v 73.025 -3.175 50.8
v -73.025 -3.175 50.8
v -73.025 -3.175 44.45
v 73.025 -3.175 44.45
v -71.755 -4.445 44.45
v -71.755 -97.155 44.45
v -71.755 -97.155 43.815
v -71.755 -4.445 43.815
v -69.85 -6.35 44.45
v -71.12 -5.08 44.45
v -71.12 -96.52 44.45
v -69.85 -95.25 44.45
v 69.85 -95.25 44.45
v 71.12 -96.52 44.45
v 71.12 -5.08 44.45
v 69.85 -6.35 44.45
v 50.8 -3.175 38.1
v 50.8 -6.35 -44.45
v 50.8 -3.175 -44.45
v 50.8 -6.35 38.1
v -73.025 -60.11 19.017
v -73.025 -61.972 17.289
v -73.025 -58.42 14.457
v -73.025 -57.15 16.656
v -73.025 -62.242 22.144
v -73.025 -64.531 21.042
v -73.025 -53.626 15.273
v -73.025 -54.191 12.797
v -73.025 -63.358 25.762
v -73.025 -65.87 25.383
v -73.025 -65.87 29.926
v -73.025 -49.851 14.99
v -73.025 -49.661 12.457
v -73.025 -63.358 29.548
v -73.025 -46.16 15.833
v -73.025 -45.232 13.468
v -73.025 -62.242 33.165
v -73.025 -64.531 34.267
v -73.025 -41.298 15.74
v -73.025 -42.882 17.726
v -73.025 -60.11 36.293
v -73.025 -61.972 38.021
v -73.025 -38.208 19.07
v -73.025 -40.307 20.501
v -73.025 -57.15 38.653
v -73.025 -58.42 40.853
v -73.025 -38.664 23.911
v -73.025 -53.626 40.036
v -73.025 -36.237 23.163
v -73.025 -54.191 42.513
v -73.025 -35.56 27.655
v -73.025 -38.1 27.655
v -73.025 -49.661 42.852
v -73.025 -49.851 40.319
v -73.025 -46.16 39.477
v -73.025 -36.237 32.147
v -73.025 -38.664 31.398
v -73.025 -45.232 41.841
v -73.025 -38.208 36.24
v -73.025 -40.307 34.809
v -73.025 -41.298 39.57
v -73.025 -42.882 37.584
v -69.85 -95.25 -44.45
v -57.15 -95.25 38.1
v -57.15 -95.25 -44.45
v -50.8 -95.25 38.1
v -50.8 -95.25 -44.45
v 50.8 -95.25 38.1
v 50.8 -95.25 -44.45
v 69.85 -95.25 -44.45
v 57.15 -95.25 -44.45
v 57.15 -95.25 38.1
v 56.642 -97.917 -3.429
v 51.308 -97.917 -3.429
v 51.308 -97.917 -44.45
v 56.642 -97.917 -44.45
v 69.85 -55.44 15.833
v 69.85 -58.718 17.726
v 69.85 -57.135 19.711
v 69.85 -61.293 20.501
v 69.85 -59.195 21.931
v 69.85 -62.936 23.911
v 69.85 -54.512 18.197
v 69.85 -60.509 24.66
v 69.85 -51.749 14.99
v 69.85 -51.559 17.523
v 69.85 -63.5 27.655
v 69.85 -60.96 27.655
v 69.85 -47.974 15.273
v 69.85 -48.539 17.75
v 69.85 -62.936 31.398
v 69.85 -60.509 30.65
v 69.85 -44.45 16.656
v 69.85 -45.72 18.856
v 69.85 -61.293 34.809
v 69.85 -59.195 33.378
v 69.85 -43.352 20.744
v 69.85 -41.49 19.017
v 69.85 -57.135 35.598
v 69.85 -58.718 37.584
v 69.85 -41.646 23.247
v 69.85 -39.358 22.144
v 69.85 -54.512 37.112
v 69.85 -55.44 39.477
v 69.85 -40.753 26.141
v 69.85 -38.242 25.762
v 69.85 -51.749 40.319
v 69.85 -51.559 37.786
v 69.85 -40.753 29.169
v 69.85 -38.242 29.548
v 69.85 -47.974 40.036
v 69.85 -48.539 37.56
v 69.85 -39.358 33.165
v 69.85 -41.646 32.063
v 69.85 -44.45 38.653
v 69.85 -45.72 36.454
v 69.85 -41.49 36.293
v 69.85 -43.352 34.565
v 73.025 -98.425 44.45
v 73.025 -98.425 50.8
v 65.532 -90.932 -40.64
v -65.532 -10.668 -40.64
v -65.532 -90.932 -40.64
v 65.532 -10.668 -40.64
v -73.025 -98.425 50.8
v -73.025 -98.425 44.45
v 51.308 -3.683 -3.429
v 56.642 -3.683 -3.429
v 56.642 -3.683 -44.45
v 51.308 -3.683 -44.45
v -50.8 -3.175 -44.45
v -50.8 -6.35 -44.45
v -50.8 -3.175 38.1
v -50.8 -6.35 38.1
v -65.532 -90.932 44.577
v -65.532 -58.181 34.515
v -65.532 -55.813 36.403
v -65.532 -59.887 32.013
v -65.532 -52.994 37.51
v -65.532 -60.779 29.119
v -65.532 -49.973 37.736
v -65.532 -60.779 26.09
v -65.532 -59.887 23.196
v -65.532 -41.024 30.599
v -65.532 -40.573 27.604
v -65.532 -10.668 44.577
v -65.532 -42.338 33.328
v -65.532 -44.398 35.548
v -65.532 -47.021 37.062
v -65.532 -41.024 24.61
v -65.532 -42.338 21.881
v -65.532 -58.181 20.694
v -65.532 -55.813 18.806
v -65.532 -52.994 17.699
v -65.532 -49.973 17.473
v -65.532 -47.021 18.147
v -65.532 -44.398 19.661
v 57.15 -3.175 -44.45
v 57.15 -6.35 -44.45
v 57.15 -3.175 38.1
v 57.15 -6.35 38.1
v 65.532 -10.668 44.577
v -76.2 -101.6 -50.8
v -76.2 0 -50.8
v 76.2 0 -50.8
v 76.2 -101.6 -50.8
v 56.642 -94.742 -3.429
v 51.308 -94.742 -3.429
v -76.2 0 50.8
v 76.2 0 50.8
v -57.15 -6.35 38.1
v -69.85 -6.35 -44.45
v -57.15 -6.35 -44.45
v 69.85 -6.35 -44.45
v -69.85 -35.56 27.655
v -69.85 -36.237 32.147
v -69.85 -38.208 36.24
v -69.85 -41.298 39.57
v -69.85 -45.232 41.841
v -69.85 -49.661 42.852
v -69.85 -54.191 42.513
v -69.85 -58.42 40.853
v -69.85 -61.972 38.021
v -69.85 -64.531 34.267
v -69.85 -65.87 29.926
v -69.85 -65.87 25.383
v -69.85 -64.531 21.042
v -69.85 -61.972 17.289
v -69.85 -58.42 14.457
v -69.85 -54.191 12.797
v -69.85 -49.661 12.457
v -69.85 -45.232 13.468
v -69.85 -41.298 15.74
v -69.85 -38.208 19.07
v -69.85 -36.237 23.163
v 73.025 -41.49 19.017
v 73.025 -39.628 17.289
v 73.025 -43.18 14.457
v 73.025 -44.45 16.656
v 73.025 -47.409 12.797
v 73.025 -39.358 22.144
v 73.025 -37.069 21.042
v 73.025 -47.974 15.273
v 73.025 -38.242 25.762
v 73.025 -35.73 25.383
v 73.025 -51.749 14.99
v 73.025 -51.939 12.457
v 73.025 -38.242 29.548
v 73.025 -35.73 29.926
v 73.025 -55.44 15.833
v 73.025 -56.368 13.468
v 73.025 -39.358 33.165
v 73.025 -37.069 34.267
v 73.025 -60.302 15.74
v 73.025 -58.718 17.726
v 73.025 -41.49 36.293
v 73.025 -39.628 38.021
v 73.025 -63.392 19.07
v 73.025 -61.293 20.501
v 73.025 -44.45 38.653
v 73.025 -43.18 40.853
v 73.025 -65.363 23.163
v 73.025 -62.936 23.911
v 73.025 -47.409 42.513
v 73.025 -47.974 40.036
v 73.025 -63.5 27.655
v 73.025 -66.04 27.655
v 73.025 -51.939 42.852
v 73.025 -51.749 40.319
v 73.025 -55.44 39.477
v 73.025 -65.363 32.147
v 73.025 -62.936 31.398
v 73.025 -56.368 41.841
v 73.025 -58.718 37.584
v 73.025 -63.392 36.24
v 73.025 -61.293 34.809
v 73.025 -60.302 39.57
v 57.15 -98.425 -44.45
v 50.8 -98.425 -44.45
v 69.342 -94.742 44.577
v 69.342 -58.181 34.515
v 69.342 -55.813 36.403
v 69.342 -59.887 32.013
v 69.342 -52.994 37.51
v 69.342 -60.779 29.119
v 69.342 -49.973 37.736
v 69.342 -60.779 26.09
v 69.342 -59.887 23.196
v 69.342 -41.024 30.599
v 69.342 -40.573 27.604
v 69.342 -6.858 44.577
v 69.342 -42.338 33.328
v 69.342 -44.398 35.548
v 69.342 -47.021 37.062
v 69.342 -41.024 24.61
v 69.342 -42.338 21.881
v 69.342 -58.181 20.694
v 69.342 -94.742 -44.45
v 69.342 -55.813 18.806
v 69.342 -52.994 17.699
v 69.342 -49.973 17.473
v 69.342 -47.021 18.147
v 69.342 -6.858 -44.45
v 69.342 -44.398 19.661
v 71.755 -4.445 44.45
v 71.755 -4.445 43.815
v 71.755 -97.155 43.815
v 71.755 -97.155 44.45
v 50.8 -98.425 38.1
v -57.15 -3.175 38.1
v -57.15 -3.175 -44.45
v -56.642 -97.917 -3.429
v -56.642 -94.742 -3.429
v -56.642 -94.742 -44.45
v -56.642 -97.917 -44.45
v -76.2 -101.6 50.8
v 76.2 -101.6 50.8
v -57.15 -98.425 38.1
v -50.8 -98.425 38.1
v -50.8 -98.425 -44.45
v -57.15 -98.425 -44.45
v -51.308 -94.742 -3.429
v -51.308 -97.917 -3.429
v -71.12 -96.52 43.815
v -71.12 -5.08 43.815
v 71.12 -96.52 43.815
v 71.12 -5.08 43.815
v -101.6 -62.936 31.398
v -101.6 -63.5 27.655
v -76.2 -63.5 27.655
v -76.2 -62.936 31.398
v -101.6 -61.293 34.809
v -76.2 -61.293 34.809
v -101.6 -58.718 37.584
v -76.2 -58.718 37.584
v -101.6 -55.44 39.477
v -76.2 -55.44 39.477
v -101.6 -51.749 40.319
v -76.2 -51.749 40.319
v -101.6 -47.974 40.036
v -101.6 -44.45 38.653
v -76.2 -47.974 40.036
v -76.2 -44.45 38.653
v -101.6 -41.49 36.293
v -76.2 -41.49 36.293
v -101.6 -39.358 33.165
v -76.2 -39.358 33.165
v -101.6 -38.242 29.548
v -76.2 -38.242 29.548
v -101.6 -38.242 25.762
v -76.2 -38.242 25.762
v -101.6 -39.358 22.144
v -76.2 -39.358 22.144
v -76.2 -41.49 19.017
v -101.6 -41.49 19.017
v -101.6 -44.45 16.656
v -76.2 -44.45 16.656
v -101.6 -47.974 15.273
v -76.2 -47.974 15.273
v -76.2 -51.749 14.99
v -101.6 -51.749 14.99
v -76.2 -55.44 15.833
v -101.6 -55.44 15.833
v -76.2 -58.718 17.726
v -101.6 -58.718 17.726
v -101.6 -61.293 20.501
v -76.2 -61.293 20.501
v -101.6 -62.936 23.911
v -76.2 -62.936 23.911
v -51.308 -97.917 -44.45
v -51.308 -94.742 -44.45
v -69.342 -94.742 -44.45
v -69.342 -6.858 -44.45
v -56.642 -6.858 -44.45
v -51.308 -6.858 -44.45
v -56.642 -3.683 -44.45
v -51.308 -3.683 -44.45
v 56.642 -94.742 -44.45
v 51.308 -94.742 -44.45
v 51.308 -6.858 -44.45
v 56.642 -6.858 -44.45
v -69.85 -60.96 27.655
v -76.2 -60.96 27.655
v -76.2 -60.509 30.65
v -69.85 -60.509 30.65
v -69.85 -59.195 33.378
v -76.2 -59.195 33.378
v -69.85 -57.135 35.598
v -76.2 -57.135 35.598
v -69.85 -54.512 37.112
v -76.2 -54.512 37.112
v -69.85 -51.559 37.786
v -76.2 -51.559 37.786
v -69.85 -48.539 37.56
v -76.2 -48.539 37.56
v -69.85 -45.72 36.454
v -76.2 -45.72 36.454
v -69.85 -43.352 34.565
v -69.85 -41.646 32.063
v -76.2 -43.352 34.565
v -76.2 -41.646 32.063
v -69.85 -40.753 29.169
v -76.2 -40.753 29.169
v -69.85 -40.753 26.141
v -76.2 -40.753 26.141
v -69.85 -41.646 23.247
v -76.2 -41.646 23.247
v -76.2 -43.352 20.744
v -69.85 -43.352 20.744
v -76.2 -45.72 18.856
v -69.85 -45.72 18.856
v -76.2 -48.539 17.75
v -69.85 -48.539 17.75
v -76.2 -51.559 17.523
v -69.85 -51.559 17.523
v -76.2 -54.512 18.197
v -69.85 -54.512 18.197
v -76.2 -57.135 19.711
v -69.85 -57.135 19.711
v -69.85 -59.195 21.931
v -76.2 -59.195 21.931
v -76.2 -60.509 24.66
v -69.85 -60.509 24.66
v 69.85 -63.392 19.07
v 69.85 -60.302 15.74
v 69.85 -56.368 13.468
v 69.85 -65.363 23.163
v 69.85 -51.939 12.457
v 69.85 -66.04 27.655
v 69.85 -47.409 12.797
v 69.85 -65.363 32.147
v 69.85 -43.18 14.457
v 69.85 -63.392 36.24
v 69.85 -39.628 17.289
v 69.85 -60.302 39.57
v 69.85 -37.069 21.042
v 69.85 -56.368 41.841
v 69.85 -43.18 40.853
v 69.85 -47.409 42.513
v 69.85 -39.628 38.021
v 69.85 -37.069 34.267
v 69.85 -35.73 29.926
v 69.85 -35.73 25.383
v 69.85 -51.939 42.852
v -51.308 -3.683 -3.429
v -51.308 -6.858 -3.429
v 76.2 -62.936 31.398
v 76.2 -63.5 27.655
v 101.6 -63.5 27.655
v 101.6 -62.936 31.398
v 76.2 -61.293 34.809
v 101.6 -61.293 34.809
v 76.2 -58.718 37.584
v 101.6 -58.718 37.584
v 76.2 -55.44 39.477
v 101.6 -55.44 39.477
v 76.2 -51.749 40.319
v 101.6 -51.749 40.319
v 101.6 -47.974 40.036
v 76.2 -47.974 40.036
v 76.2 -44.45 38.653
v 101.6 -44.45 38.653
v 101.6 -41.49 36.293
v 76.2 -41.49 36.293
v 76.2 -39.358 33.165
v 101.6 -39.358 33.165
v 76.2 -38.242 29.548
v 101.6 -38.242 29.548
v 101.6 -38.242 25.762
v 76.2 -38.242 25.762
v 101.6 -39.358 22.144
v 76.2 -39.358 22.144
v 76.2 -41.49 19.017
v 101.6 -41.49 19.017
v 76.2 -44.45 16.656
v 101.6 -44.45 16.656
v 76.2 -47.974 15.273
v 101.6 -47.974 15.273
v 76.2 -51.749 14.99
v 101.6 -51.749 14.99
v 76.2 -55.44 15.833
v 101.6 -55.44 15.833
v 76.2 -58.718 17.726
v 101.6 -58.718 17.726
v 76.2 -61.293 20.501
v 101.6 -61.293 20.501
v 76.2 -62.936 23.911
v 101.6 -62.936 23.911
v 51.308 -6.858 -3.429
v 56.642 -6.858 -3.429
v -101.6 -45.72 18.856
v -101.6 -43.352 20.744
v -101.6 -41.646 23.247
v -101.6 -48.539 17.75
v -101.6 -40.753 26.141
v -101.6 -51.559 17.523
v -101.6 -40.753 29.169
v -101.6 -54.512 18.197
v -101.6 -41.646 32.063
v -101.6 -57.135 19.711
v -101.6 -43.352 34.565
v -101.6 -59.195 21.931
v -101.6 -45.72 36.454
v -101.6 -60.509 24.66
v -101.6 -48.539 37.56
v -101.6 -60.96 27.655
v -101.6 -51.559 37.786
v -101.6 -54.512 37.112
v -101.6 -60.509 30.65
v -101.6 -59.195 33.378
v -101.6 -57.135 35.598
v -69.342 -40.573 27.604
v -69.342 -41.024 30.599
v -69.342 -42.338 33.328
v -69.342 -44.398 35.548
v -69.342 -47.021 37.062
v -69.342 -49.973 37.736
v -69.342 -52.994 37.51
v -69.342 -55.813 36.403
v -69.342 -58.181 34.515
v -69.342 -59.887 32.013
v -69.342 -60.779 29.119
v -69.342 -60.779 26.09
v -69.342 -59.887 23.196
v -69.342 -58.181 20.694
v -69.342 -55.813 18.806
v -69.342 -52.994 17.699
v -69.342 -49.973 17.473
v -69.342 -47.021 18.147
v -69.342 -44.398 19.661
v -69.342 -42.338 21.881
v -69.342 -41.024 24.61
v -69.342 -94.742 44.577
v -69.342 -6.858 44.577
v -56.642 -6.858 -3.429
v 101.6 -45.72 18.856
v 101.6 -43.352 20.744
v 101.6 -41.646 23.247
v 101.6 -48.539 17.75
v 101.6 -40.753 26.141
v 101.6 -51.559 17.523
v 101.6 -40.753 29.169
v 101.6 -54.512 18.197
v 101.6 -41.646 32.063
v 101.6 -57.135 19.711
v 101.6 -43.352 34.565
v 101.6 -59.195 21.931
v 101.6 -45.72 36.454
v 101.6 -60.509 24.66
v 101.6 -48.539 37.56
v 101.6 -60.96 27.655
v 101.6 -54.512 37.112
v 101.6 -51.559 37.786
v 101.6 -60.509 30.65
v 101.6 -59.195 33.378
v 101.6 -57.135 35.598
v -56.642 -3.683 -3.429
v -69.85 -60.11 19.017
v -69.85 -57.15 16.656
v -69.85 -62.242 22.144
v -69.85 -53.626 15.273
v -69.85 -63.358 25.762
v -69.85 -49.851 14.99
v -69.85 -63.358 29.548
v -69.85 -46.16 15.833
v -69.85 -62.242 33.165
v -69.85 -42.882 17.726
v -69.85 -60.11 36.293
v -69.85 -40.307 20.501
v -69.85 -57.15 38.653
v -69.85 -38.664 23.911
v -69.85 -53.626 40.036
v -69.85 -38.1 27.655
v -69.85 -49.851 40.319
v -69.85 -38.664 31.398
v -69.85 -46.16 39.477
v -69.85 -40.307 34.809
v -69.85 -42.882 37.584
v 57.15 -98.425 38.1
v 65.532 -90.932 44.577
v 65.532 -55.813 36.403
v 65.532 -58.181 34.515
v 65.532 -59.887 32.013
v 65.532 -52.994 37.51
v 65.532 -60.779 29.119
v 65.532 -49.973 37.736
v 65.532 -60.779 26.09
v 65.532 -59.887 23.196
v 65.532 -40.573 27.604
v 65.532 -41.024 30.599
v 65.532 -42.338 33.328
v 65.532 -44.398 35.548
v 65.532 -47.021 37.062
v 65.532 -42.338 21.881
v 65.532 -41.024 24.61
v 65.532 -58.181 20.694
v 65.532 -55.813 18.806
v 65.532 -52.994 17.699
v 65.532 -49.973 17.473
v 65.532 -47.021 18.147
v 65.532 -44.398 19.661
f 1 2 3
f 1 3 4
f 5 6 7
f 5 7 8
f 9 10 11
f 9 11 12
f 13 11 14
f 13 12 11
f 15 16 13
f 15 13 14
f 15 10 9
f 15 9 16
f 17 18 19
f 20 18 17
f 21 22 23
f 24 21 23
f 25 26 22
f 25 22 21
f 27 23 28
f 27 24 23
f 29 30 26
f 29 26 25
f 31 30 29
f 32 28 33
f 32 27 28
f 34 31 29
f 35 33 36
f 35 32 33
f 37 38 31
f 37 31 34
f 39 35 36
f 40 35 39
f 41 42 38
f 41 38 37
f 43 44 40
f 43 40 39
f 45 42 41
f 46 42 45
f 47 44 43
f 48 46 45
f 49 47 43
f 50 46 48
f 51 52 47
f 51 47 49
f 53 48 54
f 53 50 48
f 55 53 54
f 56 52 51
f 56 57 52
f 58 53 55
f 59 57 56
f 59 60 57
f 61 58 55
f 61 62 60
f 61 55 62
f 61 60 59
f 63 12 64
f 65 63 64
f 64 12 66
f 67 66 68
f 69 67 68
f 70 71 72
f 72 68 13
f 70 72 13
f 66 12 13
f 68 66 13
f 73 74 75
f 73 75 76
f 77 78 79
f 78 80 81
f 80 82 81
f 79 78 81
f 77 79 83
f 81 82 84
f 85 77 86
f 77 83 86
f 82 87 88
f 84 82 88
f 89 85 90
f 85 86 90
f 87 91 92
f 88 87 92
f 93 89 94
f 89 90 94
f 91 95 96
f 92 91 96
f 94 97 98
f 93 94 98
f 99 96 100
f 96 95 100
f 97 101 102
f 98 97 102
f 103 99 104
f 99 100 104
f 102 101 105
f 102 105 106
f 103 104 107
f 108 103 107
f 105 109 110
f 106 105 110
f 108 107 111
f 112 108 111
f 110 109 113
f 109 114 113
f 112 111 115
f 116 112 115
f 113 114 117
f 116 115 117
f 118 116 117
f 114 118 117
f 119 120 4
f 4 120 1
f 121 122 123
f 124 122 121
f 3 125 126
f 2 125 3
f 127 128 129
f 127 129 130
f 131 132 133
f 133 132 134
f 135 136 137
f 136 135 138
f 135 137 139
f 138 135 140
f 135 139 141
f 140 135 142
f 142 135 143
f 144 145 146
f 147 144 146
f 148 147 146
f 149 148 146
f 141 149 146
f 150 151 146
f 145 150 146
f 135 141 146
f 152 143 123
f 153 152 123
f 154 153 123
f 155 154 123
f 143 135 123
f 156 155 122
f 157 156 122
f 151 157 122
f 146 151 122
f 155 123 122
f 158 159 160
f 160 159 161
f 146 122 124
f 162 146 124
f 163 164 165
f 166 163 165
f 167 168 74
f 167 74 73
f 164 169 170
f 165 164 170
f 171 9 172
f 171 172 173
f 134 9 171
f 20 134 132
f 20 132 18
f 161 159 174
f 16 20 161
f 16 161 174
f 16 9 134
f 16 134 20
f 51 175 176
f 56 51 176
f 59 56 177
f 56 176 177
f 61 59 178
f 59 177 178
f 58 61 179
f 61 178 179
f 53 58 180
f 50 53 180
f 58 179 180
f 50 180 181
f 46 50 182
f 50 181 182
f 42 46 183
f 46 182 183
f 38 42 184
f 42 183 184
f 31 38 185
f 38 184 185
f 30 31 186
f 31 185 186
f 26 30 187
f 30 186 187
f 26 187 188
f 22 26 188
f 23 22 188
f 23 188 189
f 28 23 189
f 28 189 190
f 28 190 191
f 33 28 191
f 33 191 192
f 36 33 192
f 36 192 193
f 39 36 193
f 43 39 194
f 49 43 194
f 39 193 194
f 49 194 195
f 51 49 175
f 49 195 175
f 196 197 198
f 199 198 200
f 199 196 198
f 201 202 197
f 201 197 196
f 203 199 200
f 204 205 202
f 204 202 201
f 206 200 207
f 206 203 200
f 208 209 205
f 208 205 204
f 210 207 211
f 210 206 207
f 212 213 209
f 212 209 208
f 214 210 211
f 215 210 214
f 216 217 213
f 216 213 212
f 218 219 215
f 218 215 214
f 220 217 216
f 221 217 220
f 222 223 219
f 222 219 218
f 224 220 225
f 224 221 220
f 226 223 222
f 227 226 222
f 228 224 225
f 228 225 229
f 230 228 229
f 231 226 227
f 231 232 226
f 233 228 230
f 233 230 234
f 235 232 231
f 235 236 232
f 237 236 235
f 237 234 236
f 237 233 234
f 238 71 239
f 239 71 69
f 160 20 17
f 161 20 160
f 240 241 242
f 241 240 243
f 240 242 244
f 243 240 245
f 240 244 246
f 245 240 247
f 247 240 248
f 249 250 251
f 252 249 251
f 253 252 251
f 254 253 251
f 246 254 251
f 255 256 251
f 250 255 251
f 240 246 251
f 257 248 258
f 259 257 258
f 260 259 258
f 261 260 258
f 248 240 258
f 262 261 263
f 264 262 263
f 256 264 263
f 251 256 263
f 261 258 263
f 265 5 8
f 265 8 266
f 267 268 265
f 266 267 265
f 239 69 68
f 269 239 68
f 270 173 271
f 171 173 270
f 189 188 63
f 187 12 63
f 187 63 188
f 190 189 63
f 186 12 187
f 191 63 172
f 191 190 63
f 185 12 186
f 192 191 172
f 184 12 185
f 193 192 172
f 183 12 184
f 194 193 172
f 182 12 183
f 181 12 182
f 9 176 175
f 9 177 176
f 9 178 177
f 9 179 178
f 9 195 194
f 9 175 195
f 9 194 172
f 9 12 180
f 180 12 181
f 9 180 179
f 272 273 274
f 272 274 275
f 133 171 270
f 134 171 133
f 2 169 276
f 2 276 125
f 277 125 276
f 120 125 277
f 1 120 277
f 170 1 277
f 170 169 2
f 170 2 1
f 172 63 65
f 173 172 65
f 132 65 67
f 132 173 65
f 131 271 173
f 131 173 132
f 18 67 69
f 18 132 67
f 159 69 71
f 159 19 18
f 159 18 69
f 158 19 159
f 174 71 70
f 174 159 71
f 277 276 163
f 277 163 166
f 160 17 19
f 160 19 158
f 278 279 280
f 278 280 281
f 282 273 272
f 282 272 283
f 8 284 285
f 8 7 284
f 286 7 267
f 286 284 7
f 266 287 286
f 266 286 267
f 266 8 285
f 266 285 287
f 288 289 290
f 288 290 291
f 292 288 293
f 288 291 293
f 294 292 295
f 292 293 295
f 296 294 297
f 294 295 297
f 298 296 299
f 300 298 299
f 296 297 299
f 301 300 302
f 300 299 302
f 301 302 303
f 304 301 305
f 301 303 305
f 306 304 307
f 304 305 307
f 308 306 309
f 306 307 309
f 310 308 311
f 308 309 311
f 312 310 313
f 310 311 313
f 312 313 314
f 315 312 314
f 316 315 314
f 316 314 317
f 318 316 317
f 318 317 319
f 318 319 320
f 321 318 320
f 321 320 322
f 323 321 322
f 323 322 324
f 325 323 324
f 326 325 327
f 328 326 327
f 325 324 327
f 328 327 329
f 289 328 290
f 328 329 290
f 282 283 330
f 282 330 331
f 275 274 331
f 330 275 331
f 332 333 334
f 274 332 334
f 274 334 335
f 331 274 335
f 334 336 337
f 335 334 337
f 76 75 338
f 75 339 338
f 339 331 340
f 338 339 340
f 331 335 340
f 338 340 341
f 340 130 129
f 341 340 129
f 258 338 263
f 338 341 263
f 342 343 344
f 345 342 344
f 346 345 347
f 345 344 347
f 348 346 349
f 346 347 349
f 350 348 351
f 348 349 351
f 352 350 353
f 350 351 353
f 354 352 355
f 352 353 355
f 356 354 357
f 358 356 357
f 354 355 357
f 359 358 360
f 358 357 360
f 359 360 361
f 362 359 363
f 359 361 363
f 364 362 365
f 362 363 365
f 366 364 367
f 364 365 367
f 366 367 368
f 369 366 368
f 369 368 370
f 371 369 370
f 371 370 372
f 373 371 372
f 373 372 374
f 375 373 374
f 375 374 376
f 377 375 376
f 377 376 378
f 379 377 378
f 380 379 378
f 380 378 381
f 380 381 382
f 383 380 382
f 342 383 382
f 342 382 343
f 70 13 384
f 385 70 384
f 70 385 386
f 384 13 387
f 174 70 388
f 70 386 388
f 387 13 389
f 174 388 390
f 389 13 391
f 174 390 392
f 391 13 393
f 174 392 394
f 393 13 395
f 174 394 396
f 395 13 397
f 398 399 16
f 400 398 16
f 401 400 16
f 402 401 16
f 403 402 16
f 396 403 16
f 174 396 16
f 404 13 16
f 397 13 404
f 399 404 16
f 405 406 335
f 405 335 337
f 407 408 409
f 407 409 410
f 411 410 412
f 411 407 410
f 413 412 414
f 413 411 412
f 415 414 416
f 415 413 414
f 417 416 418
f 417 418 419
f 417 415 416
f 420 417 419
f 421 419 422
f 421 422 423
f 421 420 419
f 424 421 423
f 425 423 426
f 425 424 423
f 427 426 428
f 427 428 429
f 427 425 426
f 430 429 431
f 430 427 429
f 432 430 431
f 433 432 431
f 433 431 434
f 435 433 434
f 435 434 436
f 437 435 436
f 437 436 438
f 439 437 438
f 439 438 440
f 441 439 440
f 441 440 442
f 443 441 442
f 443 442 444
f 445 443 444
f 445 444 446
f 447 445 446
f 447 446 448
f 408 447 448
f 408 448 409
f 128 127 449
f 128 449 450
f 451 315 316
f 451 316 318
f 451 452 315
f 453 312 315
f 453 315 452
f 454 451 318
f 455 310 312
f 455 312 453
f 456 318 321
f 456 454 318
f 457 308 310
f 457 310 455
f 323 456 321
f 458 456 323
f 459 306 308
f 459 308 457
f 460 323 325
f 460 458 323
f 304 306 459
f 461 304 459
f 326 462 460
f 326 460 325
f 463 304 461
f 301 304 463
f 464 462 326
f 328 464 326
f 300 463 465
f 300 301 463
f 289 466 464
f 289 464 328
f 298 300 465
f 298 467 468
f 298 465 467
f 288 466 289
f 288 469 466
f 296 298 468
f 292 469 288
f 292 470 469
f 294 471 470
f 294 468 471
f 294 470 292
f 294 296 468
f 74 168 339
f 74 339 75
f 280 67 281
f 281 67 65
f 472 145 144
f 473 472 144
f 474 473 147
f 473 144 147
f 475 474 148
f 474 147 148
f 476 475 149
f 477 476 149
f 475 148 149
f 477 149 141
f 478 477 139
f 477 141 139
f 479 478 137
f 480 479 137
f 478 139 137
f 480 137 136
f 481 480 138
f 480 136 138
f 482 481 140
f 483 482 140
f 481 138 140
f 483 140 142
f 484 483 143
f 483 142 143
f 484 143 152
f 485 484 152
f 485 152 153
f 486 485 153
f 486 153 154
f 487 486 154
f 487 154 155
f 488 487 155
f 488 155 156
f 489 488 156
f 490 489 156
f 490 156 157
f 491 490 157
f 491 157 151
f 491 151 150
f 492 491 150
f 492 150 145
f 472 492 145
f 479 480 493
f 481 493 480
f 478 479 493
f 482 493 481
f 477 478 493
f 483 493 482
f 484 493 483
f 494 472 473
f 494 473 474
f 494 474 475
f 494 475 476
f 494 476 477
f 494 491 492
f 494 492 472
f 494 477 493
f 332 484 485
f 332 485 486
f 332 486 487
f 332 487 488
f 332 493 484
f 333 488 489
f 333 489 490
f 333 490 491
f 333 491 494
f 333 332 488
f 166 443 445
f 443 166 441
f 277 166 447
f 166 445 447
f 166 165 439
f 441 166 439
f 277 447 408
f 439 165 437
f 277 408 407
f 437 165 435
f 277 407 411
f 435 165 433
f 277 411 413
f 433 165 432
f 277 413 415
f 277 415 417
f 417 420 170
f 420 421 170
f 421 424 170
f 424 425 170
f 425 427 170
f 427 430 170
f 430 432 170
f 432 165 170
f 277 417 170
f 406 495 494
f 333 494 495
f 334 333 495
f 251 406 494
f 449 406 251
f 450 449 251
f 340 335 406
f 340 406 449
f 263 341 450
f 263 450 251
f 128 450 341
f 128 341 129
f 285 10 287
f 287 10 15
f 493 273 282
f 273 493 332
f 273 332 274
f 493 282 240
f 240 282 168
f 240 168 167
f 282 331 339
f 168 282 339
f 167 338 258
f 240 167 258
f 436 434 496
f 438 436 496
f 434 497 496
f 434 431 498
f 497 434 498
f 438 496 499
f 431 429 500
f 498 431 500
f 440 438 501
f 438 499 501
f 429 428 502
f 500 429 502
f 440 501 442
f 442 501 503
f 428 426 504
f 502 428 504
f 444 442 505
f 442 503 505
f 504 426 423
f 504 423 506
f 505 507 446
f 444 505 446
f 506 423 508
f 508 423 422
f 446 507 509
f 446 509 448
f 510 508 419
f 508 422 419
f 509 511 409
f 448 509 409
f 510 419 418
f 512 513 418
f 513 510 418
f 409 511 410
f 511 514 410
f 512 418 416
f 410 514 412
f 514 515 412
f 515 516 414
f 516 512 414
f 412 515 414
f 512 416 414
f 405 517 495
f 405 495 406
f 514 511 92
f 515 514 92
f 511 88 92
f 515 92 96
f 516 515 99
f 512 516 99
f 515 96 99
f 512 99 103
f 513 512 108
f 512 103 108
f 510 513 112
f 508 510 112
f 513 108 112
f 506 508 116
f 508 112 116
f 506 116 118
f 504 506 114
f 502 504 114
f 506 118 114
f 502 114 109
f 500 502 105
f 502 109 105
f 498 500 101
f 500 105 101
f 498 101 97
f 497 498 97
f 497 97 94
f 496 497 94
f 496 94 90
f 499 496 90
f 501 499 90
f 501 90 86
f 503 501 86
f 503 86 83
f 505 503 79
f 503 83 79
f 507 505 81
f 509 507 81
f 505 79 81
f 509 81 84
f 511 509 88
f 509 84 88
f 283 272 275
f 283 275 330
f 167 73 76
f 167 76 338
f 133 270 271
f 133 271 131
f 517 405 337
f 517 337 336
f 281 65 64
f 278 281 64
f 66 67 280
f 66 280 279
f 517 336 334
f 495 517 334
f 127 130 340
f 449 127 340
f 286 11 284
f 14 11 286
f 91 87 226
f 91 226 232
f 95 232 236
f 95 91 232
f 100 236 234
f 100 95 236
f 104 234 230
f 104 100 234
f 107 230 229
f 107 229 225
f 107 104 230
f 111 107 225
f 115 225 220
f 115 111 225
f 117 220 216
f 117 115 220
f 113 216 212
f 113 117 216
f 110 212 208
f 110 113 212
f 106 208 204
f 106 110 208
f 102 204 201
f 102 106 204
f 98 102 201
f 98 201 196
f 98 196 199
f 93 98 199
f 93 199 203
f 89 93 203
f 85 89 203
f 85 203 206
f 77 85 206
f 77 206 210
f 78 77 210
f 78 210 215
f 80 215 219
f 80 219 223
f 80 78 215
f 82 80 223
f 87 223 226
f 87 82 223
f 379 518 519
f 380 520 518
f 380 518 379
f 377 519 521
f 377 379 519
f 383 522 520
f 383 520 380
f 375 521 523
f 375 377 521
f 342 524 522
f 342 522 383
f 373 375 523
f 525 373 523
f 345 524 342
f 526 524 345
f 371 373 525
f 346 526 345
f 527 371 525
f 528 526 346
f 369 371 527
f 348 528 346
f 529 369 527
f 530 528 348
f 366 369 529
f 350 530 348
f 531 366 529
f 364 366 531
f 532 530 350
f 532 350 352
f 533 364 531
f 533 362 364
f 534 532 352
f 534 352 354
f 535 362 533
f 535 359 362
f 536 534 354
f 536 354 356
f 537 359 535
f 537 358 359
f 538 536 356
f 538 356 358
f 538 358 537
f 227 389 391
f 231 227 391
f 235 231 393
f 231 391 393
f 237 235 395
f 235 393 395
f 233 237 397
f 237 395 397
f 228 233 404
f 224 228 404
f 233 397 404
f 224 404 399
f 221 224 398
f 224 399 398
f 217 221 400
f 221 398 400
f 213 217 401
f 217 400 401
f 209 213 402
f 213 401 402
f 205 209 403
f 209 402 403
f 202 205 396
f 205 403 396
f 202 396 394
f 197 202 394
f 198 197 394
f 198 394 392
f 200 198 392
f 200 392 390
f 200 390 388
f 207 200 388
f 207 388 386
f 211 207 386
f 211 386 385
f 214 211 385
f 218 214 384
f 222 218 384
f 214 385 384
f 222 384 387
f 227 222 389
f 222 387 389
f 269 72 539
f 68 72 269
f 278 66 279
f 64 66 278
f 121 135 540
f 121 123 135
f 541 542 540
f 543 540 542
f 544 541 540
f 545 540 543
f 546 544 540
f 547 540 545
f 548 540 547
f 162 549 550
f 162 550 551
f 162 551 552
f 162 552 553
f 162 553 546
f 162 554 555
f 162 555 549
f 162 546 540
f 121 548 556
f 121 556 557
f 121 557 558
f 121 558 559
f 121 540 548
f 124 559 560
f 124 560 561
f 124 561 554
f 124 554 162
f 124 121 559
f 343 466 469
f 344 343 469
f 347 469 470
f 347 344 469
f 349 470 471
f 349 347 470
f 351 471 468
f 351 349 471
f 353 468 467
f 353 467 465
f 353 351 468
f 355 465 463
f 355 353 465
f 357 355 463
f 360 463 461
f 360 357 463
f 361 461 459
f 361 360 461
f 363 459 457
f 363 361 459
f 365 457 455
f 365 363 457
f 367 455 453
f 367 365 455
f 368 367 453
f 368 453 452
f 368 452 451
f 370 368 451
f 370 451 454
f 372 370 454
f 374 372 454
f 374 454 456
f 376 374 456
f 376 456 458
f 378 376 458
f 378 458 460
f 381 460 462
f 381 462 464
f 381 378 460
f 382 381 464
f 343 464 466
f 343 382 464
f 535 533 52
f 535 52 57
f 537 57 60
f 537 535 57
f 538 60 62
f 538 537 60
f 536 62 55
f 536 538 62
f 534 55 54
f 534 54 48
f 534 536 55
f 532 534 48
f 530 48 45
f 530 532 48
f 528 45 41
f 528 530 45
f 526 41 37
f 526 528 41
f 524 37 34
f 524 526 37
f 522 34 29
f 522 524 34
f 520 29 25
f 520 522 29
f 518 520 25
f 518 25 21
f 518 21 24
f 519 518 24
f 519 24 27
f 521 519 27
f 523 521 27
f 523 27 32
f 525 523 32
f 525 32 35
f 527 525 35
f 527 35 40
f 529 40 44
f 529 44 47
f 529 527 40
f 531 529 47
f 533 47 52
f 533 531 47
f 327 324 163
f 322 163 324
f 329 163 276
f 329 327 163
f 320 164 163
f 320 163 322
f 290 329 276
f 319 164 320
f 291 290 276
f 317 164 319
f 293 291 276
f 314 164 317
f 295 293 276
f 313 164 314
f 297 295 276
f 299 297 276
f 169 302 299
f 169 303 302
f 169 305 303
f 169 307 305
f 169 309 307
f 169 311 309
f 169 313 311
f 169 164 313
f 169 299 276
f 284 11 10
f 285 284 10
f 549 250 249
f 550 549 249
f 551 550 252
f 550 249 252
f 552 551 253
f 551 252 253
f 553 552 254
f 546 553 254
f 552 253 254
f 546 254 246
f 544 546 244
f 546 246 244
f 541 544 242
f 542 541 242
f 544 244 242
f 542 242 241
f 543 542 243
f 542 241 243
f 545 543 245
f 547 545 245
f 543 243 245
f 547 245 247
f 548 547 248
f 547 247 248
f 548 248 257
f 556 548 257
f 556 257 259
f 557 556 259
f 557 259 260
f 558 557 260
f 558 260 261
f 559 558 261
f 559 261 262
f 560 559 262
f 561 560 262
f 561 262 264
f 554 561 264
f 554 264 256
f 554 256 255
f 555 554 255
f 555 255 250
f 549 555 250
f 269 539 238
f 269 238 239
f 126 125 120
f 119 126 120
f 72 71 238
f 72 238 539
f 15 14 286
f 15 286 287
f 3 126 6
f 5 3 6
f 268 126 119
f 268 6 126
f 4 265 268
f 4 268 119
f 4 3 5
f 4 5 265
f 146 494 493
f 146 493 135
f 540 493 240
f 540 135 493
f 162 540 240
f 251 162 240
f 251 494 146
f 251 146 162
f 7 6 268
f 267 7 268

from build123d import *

# Parameters (mm, degrees)
F0_W          = 152.4
F0_H          = 101.6
F1_DEPTH      = 101.6
F2_R          = 12.7
F2_R_2        = 10.16
F3_DEPTH      = 25.4
F3_DEPTH_BACK = 177.8
F4_R          = 10.16
F5_DEPTH      = 152.4
F6_W          = 139.7
F6_H          = 88.9
F7_DEPTH      = 95.25
F8_W          = 146.05
F8_H          = 95.25
F9_DEPTH      = 6.35
F10_W         = 6.35
F10_H         = 82.55
F11_DEPTH     = 3.175
F12_W         = 143.51
F12_H         = 92.71
F12_W_2       = 142.24
F12_H_2       = 91.44
F13_DEPTH     = 0.635
F14_R         = 15.24
F14_R_2       = 12.7
F15_DEPTH     = 3.175
F16_R         = 15.24
F16_R_2       = 12.7
F17_DEPTH     = 3.175
F18_W         = 6.35
F18_H         = 82.55
F19_DEPTH     = 3.175
F21_DEPTH     = 82.042
F22_W         = 5.334
F22_H         = 3.175
F23_DEPTH     = 41.021
F24_T         = 3.81
F24_T3_DEPTH  = 48.641
F24_T5_DEPTH  = 12.954
F24_T7_DEPTH  = 12.954
F25_W         = 138.684
F25_H         = 87.884
F25_W_2       = 131.064
F25_H_2       = 80.264
F26_DEPTH     = 6.985
F27_R         = 10.1600221016
F28_DEPTH     = 152.4


# Not quite as in the source:
# - a shell that OpenCascade refuses in one call is made with other operations: the cavity is built on its own and cut out


with BuildPart() as f1:
    # F0 (on Front) → F1 (new body)
    with BuildSketch(Plane.XZ):
        Rectangle(F0_W, F0_H)
    extrude(amount=F1_DEPTH)

    # F2 (on face) → F3 (join, two sides)
    with BuildSketch(Plane(origin=(-76.2, 0, 0), x_dir=(0, -1, 0), z_dir=(-1, 0, 0))) as f3_sk:
        with Locations((50.8, 27.6547968388)):
            Circle(F2_R)
        with Locations((50.8, 27.6547968388)):
            Circle(F2_R_2, mode=Mode.SUBTRACT)
    extrude(amount=F3_DEPTH)
    extrude(f3_sk.sketch, amount=-F3_DEPTH_BACK)

    # F4 (on face) → F5 (cut)
    with BuildSketch(Plane(origin=(-76.2, 0, 0), x_dir=(0, -1, 0), z_dir=(-1, 0, 0))):
        with Locations((50.8, 27.6547968388)):
            Circle(F4_R)
    extrude(amount=-F5_DEPTH, mode=Mode.SUBTRACT)

    # F6 (on face) → F7 (cut)
    with BuildSketch(Plane.XY.offset(50.8)):
        with Locations((0, -50.8)):
            Rectangle(F6_W, F6_H)
    extrude(amount=-F7_DEPTH, mode=Mode.SUBTRACT)

    # F8 (on face) → F9 (cut)
    with BuildSketch(Plane.XY.offset(50.8)):
        with Locations((0, -50.8)):
            Rectangle(F8_W, F8_H)
    extrude(amount=-F9_DEPTH, mode=Mode.SUBTRACT)

    # F10 (on face) → F11 (cut)
    with BuildSketch(Plane.XZ.offset(6.35)):
        with Locations((-53.975, -3.175)):
            Rectangle(F10_W, F10_H)
        with Locations((53.975, -3.175)):
            Rectangle(F10_W, F10_H)
    extrude(amount=-F11_DEPTH, mode=Mode.SUBTRACT)

    # F12 (on face) → F13 (cut)
    with BuildSketch(Plane.XY.offset(44.45)):
        with Locations((0, -50.8)):
            Rectangle(F12_W, F12_H)
        with Locations((0, -50.8)):
            Rectangle(F12_W_2, F12_H_2, mode=Mode.SUBTRACT)
    extrude(amount=-F13_DEPTH, mode=Mode.SUBTRACT)

    # F14 (on face) → F15 (cut)
    with BuildSketch(Plane.YZ.offset(-69.85)):
        with Locations((-50.8, 27.6547968388)):
            Circle(F14_R)
        with Locations((-50.8, 27.6547968388)):
            Circle(F14_R_2, mode=Mode.SUBTRACT)
    extrude(amount=-F15_DEPTH, mode=Mode.SUBTRACT)

    # F16 (on face) → F17 (cut)
    with BuildSketch(Plane(origin=(69.85, 0, 0), x_dir=(0, -1, 0), z_dir=(-1, 0, 0))):
        with Locations((50.8, 27.6547968388)):
            Circle(F16_R)
        with Locations((50.8, 27.6547968388)):
            Circle(F16_R_2, mode=Mode.SUBTRACT)
    extrude(amount=-F17_DEPTH, mode=Mode.SUBTRACT)

    # F18 (on face) → F19 (cut)
    with BuildSketch(Plane(origin=(0, -95.25, 0), x_dir=(-1, 0, 0), z_dir=(0, 1, 0))):
        with Locations((53.975, -3.175)):
            Rectangle(F18_W, F18_H)
        with Locations((-53.975, -3.175)):
            Rectangle(F18_W, F18_H)
    extrude(amount=-F19_DEPTH, mode=Mode.SUBTRACT)


with BuildPart() as f21:
    # F20 (on face) → F21 (new body)
    with BuildSketch(Plane.XY.offset(-44.45)):
        Polygon((51.308, -97.917), (56.642, -97.917), (56.642, -94.742), (69.342, -94.742), (69.342, -6.858), (56.642, -6.858), (56.642, -3.683), (51.308, -3.683), (51.308, -6.858), (-51.308, -6.858), (-51.308, -3.683), (-56.642, -3.683), (-56.642, -6.858), (-69.342, -6.858), (-69.342, -94.742), (-56.642, -94.742), (-56.642, -97.917), (-51.308, -97.917), (-51.308, -94.742), (51.308, -94.742), align=None)
    extrude(amount=F21_DEPTH)

    # F22 (on face) → F23 (cut)
    with BuildSketch(Plane.XY.offset(37.592)):
        with Locations((53.975, -5.2705)):
            Rectangle(F22_W, F22_H)
        with Locations((53.975, -96.3295)):
            Rectangle(F22_W, F22_H)
        with Locations((-53.975, -96.3295)):
            Rectangle(F22_W, F22_H)
        with Locations((-53.975, -5.2705)):
            Rectangle(F22_W, F22_H)
    extrude(amount=-F23_DEPTH, mode=Mode.SUBTRACT)

    # F24: shell of thickness 3.81, made by hand


with BuildPart() as f24_core1:
    # F24_t2: copy of F21
    add(f21.part)

    # the walls: a layer under each face that stays
    f24_faces = [f24_core1.faces().sort_by_distance(p)[0] for p in [
        (53.975, -97.917, -23.9395),
        (51.308, -96.3295, -23.9395),
        (0, -94.742, -3.429),
        (69.342, -50.8, -3.429),
        (0, -6.858, -3.429),
        (56.642, -5.2705, -23.9395),
        (53.975, -3.683, -23.9395),
        (53.975, -5.2705, -3.429),
        (51.308, -5.2705, -23.9395),
        (-51.308, -5.2705, -23.9395),
        (-53.975, -3.683, -23.9395),
        (-53.975, -5.2705, -3.429),
        (-56.642, -5.2705, -23.9395),
        (-69.342, -50.8, -3.429),
        (-56.642, -96.3295, -23.9395),
        (-53.975, -97.917, -23.9395),
        (-53.975, -96.3295, -3.429),
        (-51.308, -96.3295, -23.9395),
        (53.975, -96.3295, -3.429),
        (56.642, -96.3295, -23.9395),
        (0, -50.8, -44.45),
    ]]
    thicken(f24_faces, amount=-F24_T, mode=Mode.SUBTRACT)

    # F24_s4 → F24_t3 (cut)
    with BuildSketch(Plane.XY.offset(-48.26)):
        Polygon((51.2699, -94.7801), (55.118, -94.742), (55.118, -90.932), (51.308, -90.932), align=None)
        Polygon((56.6801, -94.7801), (56.642, -90.932), (52.832, -90.932), (52.832, -94.742), align=None)
        Polygon((-51.2699, -94.7801), (-51.308, -90.932), (-55.118, -90.932), (-55.118, -94.742), align=None)
        Polygon((-56.6801, -94.7801), (-56.642, -90.932), (-52.832, -90.932), (-52.832, -94.742), align=None)
        Polygon((-56.6801, -6.8199), (-56.642, -10.668), (-52.832, -10.668), (-52.832, -6.858), align=None)
        Polygon((-51.2699, -6.8199), (-51.308, -10.668), (-55.118, -10.668), (-55.118, -6.858), align=None)
        Polygon((51.2699, -6.8199), (51.308, -10.668), (55.118, -10.668), (55.118, -6.858), align=None)
        Polygon((56.6801, -6.8199), (56.642, -10.668), (52.832, -10.668), (52.832, -6.858), align=None)
    extrude(amount=F24_T3_DEPTH, mode=Mode.SUBTRACT)

    # F24_s6 → F24_t5 (cut)
    with BuildSketch(Plane.YZ.offset(47.498)):
        Polygon((-94.7801, -3.3909), (-90.932, -3.429), (-90.932, -7.239), (-94.742, -7.239), align=None)
        Polygon((-6.8199, -3.3909), (-10.668, -3.429), (-10.668, -7.239), (-6.858, -7.239), align=None)
    extrude(amount=F24_T5_DEPTH, mode=Mode.SUBTRACT)

    # F24_s8 → F24_t7 (cut)
    with BuildSketch(Plane.YZ.offset(-60.452)):
        Polygon((-94.7801, -3.3909), (-90.932, -3.429), (-90.932, -7.239), (-94.742, -7.239), align=None)
        Polygon((-6.8199, -3.3909), (-10.668, -3.429), (-10.668, -7.239), (-6.858, -7.239), align=None)
    extrude(amount=F24_T7_DEPTH, mode=Mode.SUBTRACT)


with BuildPart() as f21_1:
    add(f21.part)

    # what is left inside the walls is the cavity
    f24_cavity = [f24_core1.part.solids().sort_by_distance(p)[0] for p in [
        (0, -64.177333, -40.6019),
    ]]
    add(f24_cavity, mode=Mode.SUBTRACT)

    # F25 (on face) → F26 (join)
    with BuildSketch(Plane.XY.offset(37.592)):
        with Locations((0, -50.8)):
            Rectangle(F25_W, F25_H)
        with Locations((0, -50.8)):
            Rectangle(F25_W_2, F25_H_2, mode=Mode.SUBTRACT)
    extrude(amount=F26_DEPTH)

    # F27 (on face) → F28 (cut)
    with BuildSketch(Plane.YZ.offset(69.342)):
        with Locations((-50.732751833, 27.6044615543)):
            Circle(F27_R)
    extrude(amount=-F28_DEPTH, mode=Mode.SUBTRACT)


solid = Compound([f1.part, f21_1.part])
